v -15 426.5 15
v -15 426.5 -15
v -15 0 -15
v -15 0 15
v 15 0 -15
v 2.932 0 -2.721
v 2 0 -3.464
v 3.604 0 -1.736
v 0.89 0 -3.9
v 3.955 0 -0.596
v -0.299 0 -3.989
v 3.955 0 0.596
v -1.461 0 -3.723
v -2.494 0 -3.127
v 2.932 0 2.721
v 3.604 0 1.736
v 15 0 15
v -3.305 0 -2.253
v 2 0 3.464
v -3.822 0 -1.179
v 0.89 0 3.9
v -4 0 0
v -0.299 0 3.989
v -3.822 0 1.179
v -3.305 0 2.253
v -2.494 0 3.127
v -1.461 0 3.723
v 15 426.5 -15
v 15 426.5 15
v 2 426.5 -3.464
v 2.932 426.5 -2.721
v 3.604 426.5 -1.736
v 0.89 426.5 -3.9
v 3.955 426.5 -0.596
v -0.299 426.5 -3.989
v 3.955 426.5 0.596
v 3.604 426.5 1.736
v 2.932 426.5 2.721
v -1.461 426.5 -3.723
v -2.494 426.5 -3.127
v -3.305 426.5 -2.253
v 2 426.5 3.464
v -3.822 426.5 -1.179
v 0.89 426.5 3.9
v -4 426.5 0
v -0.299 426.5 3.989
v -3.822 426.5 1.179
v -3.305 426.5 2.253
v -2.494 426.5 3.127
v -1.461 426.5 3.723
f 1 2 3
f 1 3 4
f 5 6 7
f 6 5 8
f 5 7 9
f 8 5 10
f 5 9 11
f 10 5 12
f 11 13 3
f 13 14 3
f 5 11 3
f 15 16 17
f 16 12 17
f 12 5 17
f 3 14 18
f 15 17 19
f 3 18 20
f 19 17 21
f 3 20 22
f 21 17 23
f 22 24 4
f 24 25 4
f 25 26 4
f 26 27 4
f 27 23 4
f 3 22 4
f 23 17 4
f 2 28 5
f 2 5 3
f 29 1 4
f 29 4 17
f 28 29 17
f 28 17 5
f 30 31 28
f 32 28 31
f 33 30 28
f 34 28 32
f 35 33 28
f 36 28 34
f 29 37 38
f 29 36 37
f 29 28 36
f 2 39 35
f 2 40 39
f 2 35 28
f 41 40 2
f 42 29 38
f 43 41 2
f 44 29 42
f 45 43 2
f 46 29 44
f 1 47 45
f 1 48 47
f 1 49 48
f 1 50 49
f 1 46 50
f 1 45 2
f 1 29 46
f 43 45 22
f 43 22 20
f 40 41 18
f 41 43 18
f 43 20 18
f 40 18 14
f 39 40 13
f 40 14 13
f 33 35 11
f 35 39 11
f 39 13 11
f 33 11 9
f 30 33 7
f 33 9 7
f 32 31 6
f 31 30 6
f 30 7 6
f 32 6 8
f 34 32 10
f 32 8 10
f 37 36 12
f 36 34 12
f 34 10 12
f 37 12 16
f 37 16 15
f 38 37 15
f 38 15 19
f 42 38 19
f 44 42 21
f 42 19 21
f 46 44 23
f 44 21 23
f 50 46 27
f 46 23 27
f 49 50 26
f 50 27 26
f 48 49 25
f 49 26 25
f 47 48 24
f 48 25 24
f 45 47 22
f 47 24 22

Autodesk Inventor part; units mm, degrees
ref_plane "YZ Plane" through (0, 0, 0) normal (1, 0, 0) x (0, 1, 0)
ref_plane "XZ Plane" through (0, 0, 0) normal (0, 1, 0) x (-1, 0, 0)
ref_plane "XY Plane" through (0, 0, 0) normal (0, 0, 1) x (1, 0, 0)
sketch "Boceto1" plane through (0, 0, 0) normal (0, 1, 0) x (-1, 0, 0)
  line L0 (15, 15) -> (-15, 15)
  line L1 (-15, 15) -> (-15, -15)
  line L2 (-15, -15) -> (15, -15)
  line L3 (15, -15) -> (15, 15)
  line L4 (15, 15) -> (-15, -15) construction
  circle A0 centre (0, 0) radius 4
  dimension "d0" = 30
  dimension "d1" = 8
extrude "Extrusión1" add sketch "Boceto1" along normal blind 426.5
properties part number "P_3030_1500"
